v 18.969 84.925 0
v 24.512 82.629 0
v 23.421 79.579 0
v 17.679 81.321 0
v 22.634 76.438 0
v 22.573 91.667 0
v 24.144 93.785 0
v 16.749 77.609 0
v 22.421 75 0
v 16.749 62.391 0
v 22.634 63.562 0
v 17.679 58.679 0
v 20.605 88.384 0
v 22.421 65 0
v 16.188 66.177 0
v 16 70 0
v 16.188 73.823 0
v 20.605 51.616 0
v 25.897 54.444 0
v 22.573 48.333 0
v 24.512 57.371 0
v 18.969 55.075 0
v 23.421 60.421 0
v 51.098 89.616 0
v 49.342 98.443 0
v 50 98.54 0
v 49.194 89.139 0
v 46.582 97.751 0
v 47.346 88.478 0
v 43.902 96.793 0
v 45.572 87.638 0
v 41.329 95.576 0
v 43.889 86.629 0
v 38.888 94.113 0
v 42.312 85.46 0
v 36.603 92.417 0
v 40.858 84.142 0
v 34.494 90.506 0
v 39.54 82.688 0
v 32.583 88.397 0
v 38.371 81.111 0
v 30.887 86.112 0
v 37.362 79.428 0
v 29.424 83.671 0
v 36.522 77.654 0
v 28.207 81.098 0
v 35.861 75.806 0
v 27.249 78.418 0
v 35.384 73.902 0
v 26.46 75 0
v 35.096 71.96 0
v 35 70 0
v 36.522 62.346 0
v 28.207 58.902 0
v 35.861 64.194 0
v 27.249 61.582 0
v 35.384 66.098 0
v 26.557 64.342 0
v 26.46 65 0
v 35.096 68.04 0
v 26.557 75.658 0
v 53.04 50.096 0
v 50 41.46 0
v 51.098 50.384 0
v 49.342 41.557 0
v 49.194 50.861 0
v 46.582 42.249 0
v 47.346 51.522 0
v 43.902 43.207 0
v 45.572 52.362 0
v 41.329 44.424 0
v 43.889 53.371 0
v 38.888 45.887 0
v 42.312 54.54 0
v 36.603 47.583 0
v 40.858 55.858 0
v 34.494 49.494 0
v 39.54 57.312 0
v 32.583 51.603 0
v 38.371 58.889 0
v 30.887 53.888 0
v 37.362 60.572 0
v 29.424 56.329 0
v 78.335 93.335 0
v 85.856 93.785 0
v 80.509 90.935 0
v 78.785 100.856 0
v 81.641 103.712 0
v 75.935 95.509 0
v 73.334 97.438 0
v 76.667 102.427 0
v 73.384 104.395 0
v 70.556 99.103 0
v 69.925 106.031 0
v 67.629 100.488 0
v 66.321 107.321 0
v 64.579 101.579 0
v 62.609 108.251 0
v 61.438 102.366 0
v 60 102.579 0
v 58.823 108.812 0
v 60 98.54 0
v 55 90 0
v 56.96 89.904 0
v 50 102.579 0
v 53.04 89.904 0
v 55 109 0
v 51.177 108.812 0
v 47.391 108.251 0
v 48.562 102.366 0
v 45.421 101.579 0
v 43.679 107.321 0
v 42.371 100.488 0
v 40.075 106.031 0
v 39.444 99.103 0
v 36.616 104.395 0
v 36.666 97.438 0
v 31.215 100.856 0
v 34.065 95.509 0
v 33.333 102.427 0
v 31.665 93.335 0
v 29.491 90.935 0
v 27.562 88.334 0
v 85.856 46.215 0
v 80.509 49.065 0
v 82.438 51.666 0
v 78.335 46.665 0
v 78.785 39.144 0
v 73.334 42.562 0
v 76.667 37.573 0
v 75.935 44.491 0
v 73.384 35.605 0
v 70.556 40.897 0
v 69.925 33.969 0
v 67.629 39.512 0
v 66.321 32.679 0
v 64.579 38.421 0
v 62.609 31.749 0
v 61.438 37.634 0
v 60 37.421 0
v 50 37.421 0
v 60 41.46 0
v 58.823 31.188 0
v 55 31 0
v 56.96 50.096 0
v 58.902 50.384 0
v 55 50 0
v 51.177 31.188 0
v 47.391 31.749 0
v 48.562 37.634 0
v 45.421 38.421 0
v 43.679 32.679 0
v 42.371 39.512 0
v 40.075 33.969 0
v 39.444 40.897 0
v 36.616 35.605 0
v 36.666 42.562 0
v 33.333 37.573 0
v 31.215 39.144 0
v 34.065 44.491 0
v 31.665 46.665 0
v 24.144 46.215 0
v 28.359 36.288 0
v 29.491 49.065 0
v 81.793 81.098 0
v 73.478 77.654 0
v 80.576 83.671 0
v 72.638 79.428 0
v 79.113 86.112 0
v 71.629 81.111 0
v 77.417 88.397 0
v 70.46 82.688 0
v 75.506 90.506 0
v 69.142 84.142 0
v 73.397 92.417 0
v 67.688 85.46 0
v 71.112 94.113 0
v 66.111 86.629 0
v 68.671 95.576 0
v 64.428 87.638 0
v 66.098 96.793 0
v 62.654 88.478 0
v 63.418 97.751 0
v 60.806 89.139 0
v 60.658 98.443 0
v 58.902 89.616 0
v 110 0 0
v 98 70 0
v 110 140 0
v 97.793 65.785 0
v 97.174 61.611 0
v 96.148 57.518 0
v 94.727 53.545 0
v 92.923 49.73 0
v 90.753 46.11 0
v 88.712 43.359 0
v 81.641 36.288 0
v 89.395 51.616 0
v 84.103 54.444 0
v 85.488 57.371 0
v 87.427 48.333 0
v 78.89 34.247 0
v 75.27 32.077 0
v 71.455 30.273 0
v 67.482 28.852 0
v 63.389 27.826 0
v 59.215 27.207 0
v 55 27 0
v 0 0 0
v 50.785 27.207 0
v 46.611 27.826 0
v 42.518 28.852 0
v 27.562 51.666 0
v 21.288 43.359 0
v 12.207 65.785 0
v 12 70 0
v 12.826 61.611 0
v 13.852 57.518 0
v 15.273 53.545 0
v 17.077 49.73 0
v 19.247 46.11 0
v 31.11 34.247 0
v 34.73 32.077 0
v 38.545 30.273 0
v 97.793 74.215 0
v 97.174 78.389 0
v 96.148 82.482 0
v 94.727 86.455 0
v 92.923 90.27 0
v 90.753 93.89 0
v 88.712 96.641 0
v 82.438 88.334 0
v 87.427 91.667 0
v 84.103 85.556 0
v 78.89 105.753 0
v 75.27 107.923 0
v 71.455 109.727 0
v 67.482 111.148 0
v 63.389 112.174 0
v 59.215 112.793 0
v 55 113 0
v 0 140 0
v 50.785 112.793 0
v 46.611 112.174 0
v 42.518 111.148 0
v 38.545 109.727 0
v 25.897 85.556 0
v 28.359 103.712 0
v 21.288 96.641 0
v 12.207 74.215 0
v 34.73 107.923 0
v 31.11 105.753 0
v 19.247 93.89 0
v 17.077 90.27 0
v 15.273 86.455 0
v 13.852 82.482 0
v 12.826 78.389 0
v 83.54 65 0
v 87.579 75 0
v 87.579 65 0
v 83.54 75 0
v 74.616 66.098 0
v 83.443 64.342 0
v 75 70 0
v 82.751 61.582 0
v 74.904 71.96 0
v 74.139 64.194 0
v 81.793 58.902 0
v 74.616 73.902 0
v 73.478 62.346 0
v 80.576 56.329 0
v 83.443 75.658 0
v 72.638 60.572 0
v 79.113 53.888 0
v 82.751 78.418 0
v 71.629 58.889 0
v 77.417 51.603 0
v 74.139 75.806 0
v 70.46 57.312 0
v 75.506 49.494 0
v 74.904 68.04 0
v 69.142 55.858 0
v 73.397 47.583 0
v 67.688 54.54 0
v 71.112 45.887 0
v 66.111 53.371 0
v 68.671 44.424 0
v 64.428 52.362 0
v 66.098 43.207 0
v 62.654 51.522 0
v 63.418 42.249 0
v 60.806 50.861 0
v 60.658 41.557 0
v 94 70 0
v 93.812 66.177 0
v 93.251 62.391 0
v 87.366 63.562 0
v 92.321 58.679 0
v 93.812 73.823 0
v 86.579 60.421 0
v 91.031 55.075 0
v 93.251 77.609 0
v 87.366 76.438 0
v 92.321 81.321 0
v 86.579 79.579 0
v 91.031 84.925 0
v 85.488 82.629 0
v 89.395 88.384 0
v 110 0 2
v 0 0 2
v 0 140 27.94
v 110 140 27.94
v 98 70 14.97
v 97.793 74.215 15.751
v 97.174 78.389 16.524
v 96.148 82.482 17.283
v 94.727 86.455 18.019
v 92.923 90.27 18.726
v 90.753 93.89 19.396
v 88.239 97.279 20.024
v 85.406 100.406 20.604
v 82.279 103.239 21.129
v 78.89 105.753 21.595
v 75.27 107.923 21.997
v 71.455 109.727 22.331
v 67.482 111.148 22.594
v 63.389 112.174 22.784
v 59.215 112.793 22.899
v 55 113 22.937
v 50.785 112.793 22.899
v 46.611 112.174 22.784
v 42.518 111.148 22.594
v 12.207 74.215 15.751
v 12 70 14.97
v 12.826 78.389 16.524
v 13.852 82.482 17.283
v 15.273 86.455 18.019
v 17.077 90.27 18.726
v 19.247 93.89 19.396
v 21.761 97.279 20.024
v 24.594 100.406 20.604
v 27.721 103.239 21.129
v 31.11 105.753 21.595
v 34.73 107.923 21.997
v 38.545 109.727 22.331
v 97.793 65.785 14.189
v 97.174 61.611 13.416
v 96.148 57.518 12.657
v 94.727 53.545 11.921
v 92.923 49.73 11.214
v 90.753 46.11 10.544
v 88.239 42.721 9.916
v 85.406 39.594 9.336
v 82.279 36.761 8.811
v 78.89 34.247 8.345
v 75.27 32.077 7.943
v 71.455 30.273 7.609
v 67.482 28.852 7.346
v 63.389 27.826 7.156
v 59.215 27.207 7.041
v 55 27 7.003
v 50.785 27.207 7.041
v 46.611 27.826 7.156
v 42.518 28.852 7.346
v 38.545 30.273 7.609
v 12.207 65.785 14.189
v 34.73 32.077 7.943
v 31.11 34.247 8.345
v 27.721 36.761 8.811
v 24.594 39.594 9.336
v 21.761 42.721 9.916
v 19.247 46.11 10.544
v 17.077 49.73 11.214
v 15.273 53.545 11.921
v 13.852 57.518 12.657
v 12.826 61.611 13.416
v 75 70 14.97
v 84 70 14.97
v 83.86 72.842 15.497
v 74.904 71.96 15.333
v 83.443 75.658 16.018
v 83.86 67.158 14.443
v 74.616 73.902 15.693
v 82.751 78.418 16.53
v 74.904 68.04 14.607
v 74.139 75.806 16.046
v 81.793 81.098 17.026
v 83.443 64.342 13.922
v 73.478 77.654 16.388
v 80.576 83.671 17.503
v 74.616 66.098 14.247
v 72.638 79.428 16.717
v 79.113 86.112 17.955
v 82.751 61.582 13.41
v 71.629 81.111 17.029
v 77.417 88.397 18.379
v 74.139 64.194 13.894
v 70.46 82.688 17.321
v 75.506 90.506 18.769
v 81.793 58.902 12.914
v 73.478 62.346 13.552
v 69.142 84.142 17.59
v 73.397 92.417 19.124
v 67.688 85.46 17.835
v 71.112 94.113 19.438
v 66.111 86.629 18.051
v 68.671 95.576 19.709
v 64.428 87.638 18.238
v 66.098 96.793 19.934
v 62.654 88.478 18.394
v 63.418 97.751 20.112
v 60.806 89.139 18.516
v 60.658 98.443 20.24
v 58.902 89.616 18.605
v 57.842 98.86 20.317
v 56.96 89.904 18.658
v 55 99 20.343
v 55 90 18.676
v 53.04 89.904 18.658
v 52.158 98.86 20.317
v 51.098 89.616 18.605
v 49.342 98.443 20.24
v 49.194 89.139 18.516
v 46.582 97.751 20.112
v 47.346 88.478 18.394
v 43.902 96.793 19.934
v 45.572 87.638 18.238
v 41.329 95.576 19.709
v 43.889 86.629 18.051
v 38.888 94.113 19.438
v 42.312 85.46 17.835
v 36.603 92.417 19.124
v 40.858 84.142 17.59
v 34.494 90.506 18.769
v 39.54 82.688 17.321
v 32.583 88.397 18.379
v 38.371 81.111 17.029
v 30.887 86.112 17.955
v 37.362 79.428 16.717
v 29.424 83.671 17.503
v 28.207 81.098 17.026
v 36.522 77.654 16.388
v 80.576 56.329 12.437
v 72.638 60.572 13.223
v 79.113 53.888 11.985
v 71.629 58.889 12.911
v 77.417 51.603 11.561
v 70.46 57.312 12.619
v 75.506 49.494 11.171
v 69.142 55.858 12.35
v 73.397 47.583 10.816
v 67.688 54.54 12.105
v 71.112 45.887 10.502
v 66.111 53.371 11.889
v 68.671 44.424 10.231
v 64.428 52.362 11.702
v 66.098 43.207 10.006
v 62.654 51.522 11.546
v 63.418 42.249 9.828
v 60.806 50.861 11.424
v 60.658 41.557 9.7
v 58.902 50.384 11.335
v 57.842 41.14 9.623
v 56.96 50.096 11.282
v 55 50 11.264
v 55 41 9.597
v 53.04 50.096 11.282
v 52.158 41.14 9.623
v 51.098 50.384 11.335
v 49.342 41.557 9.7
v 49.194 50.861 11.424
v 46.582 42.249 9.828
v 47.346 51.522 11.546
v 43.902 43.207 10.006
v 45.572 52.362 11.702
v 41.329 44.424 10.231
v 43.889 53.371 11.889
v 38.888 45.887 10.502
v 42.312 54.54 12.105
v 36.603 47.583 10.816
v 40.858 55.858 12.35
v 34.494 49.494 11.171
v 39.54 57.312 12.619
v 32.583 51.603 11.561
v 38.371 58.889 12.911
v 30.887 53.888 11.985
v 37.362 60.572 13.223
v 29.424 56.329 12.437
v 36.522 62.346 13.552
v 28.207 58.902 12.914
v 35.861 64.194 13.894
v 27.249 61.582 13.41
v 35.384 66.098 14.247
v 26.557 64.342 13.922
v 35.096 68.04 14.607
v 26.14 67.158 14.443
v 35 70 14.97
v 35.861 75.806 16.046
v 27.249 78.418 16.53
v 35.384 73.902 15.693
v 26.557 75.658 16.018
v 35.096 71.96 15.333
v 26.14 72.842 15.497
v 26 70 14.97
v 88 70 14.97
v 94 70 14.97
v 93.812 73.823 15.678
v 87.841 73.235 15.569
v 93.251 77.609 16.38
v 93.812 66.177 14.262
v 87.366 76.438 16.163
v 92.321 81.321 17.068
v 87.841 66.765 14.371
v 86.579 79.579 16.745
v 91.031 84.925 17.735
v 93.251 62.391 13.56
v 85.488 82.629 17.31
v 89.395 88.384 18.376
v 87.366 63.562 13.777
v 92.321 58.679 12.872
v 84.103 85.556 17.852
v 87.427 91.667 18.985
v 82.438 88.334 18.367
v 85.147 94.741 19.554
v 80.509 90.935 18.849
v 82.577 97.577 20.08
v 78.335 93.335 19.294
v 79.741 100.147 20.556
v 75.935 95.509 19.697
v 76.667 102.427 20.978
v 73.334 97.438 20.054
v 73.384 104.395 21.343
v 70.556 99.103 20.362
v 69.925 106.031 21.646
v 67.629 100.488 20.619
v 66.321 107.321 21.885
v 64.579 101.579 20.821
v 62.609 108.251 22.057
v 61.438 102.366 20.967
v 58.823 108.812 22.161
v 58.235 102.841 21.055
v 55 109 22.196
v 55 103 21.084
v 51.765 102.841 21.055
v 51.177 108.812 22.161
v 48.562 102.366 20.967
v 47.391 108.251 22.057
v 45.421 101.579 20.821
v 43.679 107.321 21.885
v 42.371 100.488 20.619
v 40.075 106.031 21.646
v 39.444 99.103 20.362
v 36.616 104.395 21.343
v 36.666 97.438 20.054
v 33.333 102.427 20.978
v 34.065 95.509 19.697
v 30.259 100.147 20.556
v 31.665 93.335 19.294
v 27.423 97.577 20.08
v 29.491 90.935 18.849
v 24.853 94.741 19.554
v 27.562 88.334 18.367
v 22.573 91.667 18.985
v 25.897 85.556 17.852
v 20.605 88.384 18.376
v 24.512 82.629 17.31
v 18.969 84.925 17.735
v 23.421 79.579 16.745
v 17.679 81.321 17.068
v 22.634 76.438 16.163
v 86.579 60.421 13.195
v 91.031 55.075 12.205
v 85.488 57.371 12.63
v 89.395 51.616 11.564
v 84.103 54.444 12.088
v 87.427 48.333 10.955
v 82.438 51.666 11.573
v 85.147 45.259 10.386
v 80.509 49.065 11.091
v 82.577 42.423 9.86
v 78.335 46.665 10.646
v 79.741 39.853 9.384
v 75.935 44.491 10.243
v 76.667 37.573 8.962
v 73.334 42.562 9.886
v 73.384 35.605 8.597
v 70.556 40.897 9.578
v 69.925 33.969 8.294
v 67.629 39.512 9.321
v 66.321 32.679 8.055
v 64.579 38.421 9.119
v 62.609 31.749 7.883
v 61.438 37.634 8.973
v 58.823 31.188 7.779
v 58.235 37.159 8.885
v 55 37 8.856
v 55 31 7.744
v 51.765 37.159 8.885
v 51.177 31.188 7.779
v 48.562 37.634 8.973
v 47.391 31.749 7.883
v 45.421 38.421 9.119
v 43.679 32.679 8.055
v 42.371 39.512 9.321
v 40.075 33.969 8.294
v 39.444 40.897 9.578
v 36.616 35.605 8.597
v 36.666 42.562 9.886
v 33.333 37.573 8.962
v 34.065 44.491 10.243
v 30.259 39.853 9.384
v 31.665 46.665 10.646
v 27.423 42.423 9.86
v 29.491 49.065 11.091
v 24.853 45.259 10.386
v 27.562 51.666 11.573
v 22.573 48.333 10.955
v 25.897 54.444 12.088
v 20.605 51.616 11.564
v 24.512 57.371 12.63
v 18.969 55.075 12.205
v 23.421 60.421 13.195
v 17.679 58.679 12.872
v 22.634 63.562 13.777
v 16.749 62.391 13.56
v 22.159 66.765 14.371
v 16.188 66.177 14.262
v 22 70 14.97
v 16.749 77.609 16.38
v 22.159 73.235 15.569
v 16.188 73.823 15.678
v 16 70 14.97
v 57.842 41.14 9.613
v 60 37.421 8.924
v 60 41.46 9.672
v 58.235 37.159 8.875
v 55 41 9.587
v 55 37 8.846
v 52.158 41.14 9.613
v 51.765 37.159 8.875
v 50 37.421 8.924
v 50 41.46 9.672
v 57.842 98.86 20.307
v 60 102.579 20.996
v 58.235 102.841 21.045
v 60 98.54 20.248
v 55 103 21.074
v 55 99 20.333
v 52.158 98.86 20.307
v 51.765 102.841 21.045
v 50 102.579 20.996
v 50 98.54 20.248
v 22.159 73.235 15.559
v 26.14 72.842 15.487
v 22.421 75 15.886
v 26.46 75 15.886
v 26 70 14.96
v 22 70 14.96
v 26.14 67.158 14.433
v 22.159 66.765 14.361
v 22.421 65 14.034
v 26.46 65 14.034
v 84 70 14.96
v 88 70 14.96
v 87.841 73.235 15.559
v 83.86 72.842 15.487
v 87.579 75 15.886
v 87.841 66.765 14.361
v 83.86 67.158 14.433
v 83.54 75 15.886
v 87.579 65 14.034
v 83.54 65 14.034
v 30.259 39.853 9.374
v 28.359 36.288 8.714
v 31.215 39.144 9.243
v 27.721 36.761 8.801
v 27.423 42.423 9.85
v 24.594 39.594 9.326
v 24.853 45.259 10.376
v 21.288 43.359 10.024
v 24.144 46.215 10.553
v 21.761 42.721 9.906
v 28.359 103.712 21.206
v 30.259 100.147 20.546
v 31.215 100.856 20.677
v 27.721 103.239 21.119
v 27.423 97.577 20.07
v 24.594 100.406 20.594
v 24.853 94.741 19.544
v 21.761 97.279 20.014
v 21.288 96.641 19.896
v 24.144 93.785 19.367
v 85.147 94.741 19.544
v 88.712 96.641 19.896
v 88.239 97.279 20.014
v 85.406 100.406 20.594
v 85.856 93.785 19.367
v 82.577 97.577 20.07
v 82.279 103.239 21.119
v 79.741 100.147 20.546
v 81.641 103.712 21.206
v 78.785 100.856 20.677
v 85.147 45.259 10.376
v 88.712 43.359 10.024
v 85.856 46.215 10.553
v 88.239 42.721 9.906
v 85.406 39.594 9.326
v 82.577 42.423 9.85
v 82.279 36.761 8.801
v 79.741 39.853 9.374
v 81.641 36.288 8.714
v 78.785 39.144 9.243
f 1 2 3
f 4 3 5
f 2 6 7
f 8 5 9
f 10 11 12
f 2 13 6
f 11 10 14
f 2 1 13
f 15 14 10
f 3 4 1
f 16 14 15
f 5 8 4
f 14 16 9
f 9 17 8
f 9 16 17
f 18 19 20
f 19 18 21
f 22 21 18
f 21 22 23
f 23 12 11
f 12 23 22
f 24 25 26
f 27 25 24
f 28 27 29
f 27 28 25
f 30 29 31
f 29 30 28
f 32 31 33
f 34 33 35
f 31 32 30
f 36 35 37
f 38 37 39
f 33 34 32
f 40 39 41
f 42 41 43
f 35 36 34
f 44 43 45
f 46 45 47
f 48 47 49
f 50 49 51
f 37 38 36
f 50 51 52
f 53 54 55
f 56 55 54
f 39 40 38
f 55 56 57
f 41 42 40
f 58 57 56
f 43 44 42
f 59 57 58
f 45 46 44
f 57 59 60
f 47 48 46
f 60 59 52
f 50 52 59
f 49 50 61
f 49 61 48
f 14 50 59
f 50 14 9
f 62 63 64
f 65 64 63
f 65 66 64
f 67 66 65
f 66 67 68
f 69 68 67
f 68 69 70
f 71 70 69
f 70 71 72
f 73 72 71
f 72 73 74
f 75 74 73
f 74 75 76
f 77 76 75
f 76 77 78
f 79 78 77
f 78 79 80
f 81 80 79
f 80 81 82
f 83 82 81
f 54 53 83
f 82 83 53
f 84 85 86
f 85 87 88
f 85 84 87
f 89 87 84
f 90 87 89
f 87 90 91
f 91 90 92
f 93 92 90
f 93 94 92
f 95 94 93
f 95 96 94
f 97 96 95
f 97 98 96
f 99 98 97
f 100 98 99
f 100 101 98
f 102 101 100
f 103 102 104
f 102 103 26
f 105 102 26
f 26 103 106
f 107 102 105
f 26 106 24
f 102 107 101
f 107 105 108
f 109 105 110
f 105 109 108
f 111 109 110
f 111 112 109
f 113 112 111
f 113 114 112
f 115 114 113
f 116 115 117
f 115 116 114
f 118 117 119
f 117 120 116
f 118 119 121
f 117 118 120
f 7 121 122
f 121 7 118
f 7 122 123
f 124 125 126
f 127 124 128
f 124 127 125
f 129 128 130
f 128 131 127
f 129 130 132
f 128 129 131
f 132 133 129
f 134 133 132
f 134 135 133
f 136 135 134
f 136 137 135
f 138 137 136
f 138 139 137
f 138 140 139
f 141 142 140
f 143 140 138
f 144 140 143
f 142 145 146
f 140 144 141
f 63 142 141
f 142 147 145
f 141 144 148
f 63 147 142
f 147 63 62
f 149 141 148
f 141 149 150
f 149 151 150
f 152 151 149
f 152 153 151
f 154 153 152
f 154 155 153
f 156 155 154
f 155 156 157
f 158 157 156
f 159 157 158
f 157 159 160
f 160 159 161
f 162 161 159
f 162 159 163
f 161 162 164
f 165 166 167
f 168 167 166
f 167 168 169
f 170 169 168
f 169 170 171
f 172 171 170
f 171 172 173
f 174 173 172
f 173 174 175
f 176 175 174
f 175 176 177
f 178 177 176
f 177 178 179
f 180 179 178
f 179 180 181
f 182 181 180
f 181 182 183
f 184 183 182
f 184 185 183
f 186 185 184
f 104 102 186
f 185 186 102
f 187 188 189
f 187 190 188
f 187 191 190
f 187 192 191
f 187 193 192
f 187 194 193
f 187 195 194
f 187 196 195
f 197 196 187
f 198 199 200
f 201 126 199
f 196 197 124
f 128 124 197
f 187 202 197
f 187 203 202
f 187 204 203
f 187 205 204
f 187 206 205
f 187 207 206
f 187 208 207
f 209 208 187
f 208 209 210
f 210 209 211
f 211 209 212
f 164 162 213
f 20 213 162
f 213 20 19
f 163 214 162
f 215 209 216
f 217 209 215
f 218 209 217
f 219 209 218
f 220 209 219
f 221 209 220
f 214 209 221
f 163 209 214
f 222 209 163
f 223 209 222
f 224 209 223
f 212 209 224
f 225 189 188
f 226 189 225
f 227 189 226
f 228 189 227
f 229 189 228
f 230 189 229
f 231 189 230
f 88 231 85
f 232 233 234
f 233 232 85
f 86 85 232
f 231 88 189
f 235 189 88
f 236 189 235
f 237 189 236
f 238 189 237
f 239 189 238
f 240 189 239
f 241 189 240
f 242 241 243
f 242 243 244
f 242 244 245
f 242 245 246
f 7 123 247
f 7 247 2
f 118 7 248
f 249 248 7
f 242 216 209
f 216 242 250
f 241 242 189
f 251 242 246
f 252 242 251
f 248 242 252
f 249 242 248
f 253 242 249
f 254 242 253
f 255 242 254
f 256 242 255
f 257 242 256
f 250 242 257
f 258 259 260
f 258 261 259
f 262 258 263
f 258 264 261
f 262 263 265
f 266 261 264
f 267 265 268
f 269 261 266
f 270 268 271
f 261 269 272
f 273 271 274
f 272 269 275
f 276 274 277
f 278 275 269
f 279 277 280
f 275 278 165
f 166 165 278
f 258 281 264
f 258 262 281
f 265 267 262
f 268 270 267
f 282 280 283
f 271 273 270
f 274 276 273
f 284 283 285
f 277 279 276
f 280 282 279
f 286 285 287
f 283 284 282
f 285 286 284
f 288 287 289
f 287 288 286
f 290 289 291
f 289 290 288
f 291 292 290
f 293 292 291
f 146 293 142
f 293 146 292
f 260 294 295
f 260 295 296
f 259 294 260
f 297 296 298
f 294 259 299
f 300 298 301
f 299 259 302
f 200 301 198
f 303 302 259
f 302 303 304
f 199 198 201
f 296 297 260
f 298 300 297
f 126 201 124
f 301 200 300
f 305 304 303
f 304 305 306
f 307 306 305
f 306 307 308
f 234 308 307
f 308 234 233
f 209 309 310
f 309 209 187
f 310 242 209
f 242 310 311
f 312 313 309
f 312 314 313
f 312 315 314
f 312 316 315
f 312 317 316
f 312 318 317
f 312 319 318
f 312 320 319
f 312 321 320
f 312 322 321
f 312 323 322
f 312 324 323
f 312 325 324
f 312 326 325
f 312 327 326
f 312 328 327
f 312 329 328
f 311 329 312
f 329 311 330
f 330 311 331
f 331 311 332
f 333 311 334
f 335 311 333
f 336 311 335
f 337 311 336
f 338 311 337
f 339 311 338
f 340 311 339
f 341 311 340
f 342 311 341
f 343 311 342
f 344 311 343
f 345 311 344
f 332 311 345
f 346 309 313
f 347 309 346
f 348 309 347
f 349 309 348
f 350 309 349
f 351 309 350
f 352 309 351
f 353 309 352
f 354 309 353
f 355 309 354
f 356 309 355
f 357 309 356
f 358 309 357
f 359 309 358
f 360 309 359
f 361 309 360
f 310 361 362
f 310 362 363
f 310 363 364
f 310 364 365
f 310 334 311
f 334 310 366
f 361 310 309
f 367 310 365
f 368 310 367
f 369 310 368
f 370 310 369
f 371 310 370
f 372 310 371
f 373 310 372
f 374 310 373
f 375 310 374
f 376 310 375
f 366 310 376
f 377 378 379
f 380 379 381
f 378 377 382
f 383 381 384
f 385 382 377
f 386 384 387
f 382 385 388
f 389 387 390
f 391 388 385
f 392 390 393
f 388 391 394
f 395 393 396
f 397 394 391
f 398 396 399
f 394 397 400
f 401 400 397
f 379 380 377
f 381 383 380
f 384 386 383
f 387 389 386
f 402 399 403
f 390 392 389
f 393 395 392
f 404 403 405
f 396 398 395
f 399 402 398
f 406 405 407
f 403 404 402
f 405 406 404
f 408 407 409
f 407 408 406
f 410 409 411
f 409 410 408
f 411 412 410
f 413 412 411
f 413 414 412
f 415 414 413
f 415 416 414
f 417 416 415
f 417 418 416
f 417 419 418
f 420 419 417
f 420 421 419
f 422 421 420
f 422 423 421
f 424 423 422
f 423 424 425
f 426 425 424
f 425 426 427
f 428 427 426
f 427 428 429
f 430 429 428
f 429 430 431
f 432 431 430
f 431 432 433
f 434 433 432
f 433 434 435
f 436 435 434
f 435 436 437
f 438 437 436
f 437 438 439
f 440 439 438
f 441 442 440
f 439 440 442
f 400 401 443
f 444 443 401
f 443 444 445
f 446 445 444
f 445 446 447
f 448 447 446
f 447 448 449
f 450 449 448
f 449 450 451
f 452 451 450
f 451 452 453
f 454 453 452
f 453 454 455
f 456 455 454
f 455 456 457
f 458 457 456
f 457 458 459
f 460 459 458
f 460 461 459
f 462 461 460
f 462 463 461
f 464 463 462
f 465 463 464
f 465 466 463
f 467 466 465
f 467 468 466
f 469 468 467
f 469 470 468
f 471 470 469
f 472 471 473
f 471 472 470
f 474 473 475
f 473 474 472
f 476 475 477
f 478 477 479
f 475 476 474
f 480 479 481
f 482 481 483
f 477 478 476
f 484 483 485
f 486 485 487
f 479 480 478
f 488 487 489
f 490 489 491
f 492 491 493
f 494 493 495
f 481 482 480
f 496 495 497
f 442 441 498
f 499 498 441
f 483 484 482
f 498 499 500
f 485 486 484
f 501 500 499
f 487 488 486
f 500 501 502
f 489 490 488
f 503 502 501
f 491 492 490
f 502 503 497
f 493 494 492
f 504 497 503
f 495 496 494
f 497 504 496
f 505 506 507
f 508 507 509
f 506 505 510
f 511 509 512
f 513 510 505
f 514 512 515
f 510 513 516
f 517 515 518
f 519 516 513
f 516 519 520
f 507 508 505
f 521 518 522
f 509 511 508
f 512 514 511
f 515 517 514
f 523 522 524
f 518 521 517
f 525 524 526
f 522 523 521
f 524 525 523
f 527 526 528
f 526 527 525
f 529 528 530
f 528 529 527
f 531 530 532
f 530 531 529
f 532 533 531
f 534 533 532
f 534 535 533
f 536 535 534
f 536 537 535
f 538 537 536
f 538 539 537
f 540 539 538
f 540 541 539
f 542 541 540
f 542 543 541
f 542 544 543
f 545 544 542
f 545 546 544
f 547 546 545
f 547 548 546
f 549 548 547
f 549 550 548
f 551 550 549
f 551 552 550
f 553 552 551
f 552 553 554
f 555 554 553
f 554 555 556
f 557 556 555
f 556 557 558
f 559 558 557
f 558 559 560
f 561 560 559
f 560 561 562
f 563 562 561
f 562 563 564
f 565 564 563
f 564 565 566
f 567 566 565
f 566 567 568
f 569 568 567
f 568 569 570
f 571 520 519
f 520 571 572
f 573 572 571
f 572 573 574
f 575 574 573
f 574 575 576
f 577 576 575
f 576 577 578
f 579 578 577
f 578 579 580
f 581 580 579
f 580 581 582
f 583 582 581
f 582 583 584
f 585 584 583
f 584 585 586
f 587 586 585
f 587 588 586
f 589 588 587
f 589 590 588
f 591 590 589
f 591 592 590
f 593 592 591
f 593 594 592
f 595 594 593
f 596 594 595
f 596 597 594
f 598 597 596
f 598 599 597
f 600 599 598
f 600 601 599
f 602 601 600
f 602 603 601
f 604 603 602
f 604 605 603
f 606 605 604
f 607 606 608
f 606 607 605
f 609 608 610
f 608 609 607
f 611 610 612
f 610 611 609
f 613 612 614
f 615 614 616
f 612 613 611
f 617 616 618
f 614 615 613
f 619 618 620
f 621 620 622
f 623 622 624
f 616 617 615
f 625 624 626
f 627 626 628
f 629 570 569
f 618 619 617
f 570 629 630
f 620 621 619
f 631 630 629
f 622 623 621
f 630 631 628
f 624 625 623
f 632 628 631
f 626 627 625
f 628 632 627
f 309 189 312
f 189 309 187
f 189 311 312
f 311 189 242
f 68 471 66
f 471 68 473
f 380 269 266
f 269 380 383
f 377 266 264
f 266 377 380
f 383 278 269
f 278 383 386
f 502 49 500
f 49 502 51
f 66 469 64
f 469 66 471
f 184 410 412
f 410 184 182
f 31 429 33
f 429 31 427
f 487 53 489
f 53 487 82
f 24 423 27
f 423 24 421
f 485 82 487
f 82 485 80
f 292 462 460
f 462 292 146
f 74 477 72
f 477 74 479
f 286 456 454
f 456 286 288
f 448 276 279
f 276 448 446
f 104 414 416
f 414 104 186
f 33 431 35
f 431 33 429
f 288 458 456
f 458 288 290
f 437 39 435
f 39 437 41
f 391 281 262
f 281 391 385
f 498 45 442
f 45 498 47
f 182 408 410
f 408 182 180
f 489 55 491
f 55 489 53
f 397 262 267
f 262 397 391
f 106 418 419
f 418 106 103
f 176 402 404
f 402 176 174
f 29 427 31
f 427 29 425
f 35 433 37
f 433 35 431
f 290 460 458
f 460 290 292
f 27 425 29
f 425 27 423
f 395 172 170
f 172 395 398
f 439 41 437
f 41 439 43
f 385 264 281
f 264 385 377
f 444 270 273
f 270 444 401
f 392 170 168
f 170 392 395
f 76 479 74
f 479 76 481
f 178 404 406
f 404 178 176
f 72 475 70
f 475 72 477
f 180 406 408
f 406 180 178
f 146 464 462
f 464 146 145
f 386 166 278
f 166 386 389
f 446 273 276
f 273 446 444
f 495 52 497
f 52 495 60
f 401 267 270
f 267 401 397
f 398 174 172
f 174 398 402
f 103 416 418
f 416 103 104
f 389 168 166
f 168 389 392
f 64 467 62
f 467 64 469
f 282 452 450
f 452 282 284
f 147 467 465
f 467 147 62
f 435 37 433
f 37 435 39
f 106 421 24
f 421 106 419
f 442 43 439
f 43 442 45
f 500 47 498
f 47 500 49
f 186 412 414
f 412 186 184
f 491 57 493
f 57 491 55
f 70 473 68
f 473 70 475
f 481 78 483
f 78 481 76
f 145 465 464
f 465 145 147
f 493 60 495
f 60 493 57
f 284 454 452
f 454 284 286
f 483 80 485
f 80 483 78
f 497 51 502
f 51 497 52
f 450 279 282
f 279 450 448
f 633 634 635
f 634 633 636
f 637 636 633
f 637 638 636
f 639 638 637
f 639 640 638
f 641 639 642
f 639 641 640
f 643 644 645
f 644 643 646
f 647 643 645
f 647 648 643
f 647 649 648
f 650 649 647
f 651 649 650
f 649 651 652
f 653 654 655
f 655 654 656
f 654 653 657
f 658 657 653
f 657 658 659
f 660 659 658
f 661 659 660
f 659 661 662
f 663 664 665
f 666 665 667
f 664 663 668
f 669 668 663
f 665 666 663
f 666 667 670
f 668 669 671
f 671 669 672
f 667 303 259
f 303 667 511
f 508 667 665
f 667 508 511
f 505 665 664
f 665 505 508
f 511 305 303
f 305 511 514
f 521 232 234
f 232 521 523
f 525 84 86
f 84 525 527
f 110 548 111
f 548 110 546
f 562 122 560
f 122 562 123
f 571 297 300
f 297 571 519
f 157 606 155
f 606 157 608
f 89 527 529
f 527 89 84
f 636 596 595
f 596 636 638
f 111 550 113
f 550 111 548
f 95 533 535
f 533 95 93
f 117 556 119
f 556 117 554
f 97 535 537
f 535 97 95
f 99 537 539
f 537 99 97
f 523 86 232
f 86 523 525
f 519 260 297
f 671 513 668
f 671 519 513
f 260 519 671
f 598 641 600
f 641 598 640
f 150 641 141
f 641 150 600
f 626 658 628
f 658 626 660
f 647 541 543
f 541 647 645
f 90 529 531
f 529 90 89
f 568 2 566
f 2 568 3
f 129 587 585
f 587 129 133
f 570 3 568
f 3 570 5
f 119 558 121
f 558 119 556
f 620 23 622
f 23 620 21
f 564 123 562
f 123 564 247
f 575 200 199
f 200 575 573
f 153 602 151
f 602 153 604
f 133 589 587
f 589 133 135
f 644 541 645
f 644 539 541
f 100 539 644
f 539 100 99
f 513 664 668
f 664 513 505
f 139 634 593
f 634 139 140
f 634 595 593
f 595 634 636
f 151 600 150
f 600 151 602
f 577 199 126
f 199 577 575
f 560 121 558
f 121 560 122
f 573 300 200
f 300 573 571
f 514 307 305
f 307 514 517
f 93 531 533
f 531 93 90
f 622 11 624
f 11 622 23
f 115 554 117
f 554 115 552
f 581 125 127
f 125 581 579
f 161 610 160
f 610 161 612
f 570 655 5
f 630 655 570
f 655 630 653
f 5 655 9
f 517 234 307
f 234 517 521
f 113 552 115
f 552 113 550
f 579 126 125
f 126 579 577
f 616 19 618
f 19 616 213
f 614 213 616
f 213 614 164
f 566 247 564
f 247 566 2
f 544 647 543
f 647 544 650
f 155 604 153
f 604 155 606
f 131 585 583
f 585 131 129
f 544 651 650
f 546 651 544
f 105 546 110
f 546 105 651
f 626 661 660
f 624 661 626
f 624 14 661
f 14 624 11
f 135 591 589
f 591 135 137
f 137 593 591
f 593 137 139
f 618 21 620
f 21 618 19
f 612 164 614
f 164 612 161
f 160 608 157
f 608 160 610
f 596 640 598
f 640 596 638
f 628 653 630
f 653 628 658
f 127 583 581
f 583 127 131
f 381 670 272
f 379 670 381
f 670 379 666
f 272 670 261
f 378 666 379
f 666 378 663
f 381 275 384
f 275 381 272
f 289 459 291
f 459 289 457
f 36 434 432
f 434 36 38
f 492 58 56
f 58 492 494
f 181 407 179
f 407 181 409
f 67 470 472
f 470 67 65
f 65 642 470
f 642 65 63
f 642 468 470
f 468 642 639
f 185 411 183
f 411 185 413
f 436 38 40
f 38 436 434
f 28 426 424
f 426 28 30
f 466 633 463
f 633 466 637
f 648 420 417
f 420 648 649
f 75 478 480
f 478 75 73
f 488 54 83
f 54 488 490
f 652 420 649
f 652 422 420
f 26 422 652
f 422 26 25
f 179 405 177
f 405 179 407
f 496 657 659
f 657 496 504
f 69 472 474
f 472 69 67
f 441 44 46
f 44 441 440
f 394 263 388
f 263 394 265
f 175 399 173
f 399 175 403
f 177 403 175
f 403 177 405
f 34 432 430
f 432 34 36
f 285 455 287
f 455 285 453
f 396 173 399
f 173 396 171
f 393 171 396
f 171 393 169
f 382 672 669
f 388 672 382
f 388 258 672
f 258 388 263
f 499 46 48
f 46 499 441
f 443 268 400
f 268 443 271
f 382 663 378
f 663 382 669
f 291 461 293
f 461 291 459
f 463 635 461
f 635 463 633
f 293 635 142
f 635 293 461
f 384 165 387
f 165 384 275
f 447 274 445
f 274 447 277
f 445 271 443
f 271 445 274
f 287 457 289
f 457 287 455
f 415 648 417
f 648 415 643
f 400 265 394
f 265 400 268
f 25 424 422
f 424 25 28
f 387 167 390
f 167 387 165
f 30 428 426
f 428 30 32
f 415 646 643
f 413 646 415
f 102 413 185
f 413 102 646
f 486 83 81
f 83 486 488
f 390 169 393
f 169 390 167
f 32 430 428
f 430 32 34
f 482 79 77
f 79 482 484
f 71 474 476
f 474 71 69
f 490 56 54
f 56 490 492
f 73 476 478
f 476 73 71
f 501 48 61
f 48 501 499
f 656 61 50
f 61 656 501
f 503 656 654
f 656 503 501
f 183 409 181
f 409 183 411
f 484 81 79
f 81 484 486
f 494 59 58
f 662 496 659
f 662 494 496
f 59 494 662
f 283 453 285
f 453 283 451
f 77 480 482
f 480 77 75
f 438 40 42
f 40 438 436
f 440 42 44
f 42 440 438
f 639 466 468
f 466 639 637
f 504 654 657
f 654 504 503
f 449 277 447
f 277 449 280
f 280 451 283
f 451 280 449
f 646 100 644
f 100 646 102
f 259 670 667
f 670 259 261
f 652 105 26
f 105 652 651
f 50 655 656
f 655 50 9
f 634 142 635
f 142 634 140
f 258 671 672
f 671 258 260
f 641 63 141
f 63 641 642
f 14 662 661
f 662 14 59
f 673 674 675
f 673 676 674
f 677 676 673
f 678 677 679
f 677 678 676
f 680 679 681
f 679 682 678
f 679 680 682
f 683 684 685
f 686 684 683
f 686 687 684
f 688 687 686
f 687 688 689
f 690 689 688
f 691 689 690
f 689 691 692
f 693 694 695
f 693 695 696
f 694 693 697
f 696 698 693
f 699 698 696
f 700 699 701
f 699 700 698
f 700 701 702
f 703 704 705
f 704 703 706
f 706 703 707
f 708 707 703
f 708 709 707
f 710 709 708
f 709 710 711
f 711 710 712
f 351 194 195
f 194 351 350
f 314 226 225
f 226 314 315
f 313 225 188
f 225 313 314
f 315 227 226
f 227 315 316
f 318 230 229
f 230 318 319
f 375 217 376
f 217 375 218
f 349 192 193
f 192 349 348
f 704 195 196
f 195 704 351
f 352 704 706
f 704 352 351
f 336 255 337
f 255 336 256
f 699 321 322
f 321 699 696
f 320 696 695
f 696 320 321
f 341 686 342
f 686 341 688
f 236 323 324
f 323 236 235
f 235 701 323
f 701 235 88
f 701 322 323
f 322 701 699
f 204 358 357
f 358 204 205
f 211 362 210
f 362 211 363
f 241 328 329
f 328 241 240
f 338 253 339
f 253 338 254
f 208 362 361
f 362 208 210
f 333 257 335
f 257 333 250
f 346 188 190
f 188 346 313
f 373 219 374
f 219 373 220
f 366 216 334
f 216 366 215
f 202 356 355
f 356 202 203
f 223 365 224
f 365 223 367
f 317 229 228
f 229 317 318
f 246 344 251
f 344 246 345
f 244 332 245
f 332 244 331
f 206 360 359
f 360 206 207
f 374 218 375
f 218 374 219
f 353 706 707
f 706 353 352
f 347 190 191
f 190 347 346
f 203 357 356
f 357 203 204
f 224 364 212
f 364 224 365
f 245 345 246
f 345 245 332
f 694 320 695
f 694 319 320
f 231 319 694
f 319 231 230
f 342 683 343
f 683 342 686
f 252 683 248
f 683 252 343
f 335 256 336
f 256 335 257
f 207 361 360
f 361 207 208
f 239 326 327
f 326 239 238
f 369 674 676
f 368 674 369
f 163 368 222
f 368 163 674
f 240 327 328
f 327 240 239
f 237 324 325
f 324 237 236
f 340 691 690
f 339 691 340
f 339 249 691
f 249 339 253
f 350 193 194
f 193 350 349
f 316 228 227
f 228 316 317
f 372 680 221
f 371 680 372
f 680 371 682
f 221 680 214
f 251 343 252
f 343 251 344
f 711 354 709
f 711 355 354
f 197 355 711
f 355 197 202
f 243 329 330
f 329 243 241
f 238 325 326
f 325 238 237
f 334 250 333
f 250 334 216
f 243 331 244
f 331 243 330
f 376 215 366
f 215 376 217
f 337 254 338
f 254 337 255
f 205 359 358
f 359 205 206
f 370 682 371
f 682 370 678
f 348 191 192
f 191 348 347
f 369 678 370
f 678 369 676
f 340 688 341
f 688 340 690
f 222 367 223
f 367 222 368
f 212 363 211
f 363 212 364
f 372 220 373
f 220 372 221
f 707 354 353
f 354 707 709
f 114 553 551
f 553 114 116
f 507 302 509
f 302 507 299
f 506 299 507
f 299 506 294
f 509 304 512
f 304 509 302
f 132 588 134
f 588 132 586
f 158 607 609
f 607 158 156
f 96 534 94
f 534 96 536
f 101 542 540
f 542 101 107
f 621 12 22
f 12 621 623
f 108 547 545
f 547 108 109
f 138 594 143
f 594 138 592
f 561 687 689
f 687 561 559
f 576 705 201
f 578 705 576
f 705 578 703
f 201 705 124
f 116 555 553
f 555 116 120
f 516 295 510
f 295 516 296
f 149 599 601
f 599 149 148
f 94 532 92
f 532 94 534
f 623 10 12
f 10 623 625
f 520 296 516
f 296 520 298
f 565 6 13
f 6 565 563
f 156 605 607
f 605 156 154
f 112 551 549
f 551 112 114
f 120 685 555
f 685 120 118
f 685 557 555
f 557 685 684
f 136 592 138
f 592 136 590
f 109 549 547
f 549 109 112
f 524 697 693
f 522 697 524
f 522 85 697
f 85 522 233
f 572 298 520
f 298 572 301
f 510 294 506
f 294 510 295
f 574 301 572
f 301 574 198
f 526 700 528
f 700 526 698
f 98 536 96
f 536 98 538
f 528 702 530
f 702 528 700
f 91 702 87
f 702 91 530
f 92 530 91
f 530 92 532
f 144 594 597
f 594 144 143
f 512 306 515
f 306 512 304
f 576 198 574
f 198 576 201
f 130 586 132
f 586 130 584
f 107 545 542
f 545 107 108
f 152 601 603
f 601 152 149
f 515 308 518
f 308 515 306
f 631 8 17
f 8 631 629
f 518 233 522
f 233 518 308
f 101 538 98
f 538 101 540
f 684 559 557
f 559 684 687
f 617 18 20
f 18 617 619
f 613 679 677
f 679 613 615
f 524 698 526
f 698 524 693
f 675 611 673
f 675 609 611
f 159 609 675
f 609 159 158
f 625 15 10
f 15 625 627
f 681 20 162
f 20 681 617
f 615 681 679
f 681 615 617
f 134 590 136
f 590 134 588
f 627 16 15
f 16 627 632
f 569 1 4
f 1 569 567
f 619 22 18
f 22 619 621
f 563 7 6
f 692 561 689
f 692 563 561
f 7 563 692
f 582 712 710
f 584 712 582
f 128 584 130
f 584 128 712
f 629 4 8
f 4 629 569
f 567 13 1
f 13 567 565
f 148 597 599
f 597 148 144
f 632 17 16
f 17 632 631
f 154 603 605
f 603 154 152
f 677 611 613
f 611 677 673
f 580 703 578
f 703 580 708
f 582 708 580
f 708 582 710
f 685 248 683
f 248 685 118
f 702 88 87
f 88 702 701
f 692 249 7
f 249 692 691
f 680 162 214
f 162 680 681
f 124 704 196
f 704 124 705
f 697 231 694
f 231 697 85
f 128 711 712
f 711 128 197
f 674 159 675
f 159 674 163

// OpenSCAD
// all measurements in mm

// global rendering parameters
$fn = 64;

// parametic figures
// the thickness of the mounting plate polyhedron at the top
thickness_angle = 1.1 * 25.4;
// thicknes at bottom
thickness = 2;
// width of the plate
width = 110;
// height of the plate
height = 140;
// diameter of the main wire hole
hole_diameter = 40;
// plate to box screw ring diameter
box_screw_ring_d = 60;
// plate to box screw diameter
box_screw_d = 4;
// light to plate screw ring diameter
light_screw_ring_d = 80;
// light to plate screw diameter
light_screw_d = 4;
// offset from halfway point for rings
ring_offset = 5;

// the bounding polyhedron for the plate body
mount_points = [
  [  0,  0,  0 ],  //0
  [ width,  0,  0 ],  //1
  [ width,  height,  0 ],  //2
  [  0,  height,  0 ],  //3
  [  0,  0,  thickness ],  //4
  [ width,  0,  thickness ],  //5
  [ width,  height,  thickness_angle ],  //6
  [  0,  height,  thickness_angle ]]; //7
// orientation of the polyhedron points
mount_faces = [
  [0,1,2,3],  // bottom
  [4,5,1,0],  // front
  [7,6,5,4],  // top
  [5,6,2,1],  // right
  [6,7,3,2],  // back
  [7,4,0,3]]; // left
  
module main() {
    difference() {
        plate_body();
        slotted_screw_ring(box_screw_ring_d, box_screw_d, ring_offset, 0);
        slotted_screw_ring(light_screw_ring_d, light_screw_d, ring_offset, 45);
    }
}

module slotted_screw_ring(screw_ring_d, screw_d, ring_offset, slot_angle) {
    // box screw ring
	translate([0, 0, -0.01])
    difference () {
        translate([width / 2, height / 2, 0]) {
            difference() {
                cylinder(h=2 * thickness + thickness_angle, d=screw_ring_d + screw_d + 2);
                cylinder(h=2 * thickness + thickness_angle, d=screw_ring_d - screw_d / 2);    
            }
        }
        difference() {
            plate_body();
            translate([width / 2, height / 2, 0]) {
                rotate([0, 0, slot_angle]) {
                    translate([ring_offset, + ring_offset, 0]) 
                        cube([screw_ring_d, screw_ring_d, thickness_angle], center=false);
                    translate([- ring_offset - screw_ring_d, + ring_offset, 0]) 
                        cube([screw_ring_d, screw_ring_d, thickness_angle], center=false);
                    translate([ring_offset, - ring_offset - screw_ring_d, 0]) 
                        cube([screw_ring_d, screw_ring_d, thickness_angle], center=false);
                    translate([- ring_offset - screw_ring_d, - screw_ring_d - ring_offset, 0]) 
                        cube([screw_ring_d, screw_ring_d, thickness_angle], center=false);
                }
            }
        }
	}
 }

// the main polyhedron of the mounting plate with the wire hole cutout
module plate_body() {
    difference() {
         // the plate body
        polyhedron( mount_points, mount_faces, center=true);
        // the main wire hole
        translate([width / 2, height / 2, -.01])
            cylinder(h=2 * thickness + thickness_angle, d=hole_diameter);
    }
}

// render the mount
main();
